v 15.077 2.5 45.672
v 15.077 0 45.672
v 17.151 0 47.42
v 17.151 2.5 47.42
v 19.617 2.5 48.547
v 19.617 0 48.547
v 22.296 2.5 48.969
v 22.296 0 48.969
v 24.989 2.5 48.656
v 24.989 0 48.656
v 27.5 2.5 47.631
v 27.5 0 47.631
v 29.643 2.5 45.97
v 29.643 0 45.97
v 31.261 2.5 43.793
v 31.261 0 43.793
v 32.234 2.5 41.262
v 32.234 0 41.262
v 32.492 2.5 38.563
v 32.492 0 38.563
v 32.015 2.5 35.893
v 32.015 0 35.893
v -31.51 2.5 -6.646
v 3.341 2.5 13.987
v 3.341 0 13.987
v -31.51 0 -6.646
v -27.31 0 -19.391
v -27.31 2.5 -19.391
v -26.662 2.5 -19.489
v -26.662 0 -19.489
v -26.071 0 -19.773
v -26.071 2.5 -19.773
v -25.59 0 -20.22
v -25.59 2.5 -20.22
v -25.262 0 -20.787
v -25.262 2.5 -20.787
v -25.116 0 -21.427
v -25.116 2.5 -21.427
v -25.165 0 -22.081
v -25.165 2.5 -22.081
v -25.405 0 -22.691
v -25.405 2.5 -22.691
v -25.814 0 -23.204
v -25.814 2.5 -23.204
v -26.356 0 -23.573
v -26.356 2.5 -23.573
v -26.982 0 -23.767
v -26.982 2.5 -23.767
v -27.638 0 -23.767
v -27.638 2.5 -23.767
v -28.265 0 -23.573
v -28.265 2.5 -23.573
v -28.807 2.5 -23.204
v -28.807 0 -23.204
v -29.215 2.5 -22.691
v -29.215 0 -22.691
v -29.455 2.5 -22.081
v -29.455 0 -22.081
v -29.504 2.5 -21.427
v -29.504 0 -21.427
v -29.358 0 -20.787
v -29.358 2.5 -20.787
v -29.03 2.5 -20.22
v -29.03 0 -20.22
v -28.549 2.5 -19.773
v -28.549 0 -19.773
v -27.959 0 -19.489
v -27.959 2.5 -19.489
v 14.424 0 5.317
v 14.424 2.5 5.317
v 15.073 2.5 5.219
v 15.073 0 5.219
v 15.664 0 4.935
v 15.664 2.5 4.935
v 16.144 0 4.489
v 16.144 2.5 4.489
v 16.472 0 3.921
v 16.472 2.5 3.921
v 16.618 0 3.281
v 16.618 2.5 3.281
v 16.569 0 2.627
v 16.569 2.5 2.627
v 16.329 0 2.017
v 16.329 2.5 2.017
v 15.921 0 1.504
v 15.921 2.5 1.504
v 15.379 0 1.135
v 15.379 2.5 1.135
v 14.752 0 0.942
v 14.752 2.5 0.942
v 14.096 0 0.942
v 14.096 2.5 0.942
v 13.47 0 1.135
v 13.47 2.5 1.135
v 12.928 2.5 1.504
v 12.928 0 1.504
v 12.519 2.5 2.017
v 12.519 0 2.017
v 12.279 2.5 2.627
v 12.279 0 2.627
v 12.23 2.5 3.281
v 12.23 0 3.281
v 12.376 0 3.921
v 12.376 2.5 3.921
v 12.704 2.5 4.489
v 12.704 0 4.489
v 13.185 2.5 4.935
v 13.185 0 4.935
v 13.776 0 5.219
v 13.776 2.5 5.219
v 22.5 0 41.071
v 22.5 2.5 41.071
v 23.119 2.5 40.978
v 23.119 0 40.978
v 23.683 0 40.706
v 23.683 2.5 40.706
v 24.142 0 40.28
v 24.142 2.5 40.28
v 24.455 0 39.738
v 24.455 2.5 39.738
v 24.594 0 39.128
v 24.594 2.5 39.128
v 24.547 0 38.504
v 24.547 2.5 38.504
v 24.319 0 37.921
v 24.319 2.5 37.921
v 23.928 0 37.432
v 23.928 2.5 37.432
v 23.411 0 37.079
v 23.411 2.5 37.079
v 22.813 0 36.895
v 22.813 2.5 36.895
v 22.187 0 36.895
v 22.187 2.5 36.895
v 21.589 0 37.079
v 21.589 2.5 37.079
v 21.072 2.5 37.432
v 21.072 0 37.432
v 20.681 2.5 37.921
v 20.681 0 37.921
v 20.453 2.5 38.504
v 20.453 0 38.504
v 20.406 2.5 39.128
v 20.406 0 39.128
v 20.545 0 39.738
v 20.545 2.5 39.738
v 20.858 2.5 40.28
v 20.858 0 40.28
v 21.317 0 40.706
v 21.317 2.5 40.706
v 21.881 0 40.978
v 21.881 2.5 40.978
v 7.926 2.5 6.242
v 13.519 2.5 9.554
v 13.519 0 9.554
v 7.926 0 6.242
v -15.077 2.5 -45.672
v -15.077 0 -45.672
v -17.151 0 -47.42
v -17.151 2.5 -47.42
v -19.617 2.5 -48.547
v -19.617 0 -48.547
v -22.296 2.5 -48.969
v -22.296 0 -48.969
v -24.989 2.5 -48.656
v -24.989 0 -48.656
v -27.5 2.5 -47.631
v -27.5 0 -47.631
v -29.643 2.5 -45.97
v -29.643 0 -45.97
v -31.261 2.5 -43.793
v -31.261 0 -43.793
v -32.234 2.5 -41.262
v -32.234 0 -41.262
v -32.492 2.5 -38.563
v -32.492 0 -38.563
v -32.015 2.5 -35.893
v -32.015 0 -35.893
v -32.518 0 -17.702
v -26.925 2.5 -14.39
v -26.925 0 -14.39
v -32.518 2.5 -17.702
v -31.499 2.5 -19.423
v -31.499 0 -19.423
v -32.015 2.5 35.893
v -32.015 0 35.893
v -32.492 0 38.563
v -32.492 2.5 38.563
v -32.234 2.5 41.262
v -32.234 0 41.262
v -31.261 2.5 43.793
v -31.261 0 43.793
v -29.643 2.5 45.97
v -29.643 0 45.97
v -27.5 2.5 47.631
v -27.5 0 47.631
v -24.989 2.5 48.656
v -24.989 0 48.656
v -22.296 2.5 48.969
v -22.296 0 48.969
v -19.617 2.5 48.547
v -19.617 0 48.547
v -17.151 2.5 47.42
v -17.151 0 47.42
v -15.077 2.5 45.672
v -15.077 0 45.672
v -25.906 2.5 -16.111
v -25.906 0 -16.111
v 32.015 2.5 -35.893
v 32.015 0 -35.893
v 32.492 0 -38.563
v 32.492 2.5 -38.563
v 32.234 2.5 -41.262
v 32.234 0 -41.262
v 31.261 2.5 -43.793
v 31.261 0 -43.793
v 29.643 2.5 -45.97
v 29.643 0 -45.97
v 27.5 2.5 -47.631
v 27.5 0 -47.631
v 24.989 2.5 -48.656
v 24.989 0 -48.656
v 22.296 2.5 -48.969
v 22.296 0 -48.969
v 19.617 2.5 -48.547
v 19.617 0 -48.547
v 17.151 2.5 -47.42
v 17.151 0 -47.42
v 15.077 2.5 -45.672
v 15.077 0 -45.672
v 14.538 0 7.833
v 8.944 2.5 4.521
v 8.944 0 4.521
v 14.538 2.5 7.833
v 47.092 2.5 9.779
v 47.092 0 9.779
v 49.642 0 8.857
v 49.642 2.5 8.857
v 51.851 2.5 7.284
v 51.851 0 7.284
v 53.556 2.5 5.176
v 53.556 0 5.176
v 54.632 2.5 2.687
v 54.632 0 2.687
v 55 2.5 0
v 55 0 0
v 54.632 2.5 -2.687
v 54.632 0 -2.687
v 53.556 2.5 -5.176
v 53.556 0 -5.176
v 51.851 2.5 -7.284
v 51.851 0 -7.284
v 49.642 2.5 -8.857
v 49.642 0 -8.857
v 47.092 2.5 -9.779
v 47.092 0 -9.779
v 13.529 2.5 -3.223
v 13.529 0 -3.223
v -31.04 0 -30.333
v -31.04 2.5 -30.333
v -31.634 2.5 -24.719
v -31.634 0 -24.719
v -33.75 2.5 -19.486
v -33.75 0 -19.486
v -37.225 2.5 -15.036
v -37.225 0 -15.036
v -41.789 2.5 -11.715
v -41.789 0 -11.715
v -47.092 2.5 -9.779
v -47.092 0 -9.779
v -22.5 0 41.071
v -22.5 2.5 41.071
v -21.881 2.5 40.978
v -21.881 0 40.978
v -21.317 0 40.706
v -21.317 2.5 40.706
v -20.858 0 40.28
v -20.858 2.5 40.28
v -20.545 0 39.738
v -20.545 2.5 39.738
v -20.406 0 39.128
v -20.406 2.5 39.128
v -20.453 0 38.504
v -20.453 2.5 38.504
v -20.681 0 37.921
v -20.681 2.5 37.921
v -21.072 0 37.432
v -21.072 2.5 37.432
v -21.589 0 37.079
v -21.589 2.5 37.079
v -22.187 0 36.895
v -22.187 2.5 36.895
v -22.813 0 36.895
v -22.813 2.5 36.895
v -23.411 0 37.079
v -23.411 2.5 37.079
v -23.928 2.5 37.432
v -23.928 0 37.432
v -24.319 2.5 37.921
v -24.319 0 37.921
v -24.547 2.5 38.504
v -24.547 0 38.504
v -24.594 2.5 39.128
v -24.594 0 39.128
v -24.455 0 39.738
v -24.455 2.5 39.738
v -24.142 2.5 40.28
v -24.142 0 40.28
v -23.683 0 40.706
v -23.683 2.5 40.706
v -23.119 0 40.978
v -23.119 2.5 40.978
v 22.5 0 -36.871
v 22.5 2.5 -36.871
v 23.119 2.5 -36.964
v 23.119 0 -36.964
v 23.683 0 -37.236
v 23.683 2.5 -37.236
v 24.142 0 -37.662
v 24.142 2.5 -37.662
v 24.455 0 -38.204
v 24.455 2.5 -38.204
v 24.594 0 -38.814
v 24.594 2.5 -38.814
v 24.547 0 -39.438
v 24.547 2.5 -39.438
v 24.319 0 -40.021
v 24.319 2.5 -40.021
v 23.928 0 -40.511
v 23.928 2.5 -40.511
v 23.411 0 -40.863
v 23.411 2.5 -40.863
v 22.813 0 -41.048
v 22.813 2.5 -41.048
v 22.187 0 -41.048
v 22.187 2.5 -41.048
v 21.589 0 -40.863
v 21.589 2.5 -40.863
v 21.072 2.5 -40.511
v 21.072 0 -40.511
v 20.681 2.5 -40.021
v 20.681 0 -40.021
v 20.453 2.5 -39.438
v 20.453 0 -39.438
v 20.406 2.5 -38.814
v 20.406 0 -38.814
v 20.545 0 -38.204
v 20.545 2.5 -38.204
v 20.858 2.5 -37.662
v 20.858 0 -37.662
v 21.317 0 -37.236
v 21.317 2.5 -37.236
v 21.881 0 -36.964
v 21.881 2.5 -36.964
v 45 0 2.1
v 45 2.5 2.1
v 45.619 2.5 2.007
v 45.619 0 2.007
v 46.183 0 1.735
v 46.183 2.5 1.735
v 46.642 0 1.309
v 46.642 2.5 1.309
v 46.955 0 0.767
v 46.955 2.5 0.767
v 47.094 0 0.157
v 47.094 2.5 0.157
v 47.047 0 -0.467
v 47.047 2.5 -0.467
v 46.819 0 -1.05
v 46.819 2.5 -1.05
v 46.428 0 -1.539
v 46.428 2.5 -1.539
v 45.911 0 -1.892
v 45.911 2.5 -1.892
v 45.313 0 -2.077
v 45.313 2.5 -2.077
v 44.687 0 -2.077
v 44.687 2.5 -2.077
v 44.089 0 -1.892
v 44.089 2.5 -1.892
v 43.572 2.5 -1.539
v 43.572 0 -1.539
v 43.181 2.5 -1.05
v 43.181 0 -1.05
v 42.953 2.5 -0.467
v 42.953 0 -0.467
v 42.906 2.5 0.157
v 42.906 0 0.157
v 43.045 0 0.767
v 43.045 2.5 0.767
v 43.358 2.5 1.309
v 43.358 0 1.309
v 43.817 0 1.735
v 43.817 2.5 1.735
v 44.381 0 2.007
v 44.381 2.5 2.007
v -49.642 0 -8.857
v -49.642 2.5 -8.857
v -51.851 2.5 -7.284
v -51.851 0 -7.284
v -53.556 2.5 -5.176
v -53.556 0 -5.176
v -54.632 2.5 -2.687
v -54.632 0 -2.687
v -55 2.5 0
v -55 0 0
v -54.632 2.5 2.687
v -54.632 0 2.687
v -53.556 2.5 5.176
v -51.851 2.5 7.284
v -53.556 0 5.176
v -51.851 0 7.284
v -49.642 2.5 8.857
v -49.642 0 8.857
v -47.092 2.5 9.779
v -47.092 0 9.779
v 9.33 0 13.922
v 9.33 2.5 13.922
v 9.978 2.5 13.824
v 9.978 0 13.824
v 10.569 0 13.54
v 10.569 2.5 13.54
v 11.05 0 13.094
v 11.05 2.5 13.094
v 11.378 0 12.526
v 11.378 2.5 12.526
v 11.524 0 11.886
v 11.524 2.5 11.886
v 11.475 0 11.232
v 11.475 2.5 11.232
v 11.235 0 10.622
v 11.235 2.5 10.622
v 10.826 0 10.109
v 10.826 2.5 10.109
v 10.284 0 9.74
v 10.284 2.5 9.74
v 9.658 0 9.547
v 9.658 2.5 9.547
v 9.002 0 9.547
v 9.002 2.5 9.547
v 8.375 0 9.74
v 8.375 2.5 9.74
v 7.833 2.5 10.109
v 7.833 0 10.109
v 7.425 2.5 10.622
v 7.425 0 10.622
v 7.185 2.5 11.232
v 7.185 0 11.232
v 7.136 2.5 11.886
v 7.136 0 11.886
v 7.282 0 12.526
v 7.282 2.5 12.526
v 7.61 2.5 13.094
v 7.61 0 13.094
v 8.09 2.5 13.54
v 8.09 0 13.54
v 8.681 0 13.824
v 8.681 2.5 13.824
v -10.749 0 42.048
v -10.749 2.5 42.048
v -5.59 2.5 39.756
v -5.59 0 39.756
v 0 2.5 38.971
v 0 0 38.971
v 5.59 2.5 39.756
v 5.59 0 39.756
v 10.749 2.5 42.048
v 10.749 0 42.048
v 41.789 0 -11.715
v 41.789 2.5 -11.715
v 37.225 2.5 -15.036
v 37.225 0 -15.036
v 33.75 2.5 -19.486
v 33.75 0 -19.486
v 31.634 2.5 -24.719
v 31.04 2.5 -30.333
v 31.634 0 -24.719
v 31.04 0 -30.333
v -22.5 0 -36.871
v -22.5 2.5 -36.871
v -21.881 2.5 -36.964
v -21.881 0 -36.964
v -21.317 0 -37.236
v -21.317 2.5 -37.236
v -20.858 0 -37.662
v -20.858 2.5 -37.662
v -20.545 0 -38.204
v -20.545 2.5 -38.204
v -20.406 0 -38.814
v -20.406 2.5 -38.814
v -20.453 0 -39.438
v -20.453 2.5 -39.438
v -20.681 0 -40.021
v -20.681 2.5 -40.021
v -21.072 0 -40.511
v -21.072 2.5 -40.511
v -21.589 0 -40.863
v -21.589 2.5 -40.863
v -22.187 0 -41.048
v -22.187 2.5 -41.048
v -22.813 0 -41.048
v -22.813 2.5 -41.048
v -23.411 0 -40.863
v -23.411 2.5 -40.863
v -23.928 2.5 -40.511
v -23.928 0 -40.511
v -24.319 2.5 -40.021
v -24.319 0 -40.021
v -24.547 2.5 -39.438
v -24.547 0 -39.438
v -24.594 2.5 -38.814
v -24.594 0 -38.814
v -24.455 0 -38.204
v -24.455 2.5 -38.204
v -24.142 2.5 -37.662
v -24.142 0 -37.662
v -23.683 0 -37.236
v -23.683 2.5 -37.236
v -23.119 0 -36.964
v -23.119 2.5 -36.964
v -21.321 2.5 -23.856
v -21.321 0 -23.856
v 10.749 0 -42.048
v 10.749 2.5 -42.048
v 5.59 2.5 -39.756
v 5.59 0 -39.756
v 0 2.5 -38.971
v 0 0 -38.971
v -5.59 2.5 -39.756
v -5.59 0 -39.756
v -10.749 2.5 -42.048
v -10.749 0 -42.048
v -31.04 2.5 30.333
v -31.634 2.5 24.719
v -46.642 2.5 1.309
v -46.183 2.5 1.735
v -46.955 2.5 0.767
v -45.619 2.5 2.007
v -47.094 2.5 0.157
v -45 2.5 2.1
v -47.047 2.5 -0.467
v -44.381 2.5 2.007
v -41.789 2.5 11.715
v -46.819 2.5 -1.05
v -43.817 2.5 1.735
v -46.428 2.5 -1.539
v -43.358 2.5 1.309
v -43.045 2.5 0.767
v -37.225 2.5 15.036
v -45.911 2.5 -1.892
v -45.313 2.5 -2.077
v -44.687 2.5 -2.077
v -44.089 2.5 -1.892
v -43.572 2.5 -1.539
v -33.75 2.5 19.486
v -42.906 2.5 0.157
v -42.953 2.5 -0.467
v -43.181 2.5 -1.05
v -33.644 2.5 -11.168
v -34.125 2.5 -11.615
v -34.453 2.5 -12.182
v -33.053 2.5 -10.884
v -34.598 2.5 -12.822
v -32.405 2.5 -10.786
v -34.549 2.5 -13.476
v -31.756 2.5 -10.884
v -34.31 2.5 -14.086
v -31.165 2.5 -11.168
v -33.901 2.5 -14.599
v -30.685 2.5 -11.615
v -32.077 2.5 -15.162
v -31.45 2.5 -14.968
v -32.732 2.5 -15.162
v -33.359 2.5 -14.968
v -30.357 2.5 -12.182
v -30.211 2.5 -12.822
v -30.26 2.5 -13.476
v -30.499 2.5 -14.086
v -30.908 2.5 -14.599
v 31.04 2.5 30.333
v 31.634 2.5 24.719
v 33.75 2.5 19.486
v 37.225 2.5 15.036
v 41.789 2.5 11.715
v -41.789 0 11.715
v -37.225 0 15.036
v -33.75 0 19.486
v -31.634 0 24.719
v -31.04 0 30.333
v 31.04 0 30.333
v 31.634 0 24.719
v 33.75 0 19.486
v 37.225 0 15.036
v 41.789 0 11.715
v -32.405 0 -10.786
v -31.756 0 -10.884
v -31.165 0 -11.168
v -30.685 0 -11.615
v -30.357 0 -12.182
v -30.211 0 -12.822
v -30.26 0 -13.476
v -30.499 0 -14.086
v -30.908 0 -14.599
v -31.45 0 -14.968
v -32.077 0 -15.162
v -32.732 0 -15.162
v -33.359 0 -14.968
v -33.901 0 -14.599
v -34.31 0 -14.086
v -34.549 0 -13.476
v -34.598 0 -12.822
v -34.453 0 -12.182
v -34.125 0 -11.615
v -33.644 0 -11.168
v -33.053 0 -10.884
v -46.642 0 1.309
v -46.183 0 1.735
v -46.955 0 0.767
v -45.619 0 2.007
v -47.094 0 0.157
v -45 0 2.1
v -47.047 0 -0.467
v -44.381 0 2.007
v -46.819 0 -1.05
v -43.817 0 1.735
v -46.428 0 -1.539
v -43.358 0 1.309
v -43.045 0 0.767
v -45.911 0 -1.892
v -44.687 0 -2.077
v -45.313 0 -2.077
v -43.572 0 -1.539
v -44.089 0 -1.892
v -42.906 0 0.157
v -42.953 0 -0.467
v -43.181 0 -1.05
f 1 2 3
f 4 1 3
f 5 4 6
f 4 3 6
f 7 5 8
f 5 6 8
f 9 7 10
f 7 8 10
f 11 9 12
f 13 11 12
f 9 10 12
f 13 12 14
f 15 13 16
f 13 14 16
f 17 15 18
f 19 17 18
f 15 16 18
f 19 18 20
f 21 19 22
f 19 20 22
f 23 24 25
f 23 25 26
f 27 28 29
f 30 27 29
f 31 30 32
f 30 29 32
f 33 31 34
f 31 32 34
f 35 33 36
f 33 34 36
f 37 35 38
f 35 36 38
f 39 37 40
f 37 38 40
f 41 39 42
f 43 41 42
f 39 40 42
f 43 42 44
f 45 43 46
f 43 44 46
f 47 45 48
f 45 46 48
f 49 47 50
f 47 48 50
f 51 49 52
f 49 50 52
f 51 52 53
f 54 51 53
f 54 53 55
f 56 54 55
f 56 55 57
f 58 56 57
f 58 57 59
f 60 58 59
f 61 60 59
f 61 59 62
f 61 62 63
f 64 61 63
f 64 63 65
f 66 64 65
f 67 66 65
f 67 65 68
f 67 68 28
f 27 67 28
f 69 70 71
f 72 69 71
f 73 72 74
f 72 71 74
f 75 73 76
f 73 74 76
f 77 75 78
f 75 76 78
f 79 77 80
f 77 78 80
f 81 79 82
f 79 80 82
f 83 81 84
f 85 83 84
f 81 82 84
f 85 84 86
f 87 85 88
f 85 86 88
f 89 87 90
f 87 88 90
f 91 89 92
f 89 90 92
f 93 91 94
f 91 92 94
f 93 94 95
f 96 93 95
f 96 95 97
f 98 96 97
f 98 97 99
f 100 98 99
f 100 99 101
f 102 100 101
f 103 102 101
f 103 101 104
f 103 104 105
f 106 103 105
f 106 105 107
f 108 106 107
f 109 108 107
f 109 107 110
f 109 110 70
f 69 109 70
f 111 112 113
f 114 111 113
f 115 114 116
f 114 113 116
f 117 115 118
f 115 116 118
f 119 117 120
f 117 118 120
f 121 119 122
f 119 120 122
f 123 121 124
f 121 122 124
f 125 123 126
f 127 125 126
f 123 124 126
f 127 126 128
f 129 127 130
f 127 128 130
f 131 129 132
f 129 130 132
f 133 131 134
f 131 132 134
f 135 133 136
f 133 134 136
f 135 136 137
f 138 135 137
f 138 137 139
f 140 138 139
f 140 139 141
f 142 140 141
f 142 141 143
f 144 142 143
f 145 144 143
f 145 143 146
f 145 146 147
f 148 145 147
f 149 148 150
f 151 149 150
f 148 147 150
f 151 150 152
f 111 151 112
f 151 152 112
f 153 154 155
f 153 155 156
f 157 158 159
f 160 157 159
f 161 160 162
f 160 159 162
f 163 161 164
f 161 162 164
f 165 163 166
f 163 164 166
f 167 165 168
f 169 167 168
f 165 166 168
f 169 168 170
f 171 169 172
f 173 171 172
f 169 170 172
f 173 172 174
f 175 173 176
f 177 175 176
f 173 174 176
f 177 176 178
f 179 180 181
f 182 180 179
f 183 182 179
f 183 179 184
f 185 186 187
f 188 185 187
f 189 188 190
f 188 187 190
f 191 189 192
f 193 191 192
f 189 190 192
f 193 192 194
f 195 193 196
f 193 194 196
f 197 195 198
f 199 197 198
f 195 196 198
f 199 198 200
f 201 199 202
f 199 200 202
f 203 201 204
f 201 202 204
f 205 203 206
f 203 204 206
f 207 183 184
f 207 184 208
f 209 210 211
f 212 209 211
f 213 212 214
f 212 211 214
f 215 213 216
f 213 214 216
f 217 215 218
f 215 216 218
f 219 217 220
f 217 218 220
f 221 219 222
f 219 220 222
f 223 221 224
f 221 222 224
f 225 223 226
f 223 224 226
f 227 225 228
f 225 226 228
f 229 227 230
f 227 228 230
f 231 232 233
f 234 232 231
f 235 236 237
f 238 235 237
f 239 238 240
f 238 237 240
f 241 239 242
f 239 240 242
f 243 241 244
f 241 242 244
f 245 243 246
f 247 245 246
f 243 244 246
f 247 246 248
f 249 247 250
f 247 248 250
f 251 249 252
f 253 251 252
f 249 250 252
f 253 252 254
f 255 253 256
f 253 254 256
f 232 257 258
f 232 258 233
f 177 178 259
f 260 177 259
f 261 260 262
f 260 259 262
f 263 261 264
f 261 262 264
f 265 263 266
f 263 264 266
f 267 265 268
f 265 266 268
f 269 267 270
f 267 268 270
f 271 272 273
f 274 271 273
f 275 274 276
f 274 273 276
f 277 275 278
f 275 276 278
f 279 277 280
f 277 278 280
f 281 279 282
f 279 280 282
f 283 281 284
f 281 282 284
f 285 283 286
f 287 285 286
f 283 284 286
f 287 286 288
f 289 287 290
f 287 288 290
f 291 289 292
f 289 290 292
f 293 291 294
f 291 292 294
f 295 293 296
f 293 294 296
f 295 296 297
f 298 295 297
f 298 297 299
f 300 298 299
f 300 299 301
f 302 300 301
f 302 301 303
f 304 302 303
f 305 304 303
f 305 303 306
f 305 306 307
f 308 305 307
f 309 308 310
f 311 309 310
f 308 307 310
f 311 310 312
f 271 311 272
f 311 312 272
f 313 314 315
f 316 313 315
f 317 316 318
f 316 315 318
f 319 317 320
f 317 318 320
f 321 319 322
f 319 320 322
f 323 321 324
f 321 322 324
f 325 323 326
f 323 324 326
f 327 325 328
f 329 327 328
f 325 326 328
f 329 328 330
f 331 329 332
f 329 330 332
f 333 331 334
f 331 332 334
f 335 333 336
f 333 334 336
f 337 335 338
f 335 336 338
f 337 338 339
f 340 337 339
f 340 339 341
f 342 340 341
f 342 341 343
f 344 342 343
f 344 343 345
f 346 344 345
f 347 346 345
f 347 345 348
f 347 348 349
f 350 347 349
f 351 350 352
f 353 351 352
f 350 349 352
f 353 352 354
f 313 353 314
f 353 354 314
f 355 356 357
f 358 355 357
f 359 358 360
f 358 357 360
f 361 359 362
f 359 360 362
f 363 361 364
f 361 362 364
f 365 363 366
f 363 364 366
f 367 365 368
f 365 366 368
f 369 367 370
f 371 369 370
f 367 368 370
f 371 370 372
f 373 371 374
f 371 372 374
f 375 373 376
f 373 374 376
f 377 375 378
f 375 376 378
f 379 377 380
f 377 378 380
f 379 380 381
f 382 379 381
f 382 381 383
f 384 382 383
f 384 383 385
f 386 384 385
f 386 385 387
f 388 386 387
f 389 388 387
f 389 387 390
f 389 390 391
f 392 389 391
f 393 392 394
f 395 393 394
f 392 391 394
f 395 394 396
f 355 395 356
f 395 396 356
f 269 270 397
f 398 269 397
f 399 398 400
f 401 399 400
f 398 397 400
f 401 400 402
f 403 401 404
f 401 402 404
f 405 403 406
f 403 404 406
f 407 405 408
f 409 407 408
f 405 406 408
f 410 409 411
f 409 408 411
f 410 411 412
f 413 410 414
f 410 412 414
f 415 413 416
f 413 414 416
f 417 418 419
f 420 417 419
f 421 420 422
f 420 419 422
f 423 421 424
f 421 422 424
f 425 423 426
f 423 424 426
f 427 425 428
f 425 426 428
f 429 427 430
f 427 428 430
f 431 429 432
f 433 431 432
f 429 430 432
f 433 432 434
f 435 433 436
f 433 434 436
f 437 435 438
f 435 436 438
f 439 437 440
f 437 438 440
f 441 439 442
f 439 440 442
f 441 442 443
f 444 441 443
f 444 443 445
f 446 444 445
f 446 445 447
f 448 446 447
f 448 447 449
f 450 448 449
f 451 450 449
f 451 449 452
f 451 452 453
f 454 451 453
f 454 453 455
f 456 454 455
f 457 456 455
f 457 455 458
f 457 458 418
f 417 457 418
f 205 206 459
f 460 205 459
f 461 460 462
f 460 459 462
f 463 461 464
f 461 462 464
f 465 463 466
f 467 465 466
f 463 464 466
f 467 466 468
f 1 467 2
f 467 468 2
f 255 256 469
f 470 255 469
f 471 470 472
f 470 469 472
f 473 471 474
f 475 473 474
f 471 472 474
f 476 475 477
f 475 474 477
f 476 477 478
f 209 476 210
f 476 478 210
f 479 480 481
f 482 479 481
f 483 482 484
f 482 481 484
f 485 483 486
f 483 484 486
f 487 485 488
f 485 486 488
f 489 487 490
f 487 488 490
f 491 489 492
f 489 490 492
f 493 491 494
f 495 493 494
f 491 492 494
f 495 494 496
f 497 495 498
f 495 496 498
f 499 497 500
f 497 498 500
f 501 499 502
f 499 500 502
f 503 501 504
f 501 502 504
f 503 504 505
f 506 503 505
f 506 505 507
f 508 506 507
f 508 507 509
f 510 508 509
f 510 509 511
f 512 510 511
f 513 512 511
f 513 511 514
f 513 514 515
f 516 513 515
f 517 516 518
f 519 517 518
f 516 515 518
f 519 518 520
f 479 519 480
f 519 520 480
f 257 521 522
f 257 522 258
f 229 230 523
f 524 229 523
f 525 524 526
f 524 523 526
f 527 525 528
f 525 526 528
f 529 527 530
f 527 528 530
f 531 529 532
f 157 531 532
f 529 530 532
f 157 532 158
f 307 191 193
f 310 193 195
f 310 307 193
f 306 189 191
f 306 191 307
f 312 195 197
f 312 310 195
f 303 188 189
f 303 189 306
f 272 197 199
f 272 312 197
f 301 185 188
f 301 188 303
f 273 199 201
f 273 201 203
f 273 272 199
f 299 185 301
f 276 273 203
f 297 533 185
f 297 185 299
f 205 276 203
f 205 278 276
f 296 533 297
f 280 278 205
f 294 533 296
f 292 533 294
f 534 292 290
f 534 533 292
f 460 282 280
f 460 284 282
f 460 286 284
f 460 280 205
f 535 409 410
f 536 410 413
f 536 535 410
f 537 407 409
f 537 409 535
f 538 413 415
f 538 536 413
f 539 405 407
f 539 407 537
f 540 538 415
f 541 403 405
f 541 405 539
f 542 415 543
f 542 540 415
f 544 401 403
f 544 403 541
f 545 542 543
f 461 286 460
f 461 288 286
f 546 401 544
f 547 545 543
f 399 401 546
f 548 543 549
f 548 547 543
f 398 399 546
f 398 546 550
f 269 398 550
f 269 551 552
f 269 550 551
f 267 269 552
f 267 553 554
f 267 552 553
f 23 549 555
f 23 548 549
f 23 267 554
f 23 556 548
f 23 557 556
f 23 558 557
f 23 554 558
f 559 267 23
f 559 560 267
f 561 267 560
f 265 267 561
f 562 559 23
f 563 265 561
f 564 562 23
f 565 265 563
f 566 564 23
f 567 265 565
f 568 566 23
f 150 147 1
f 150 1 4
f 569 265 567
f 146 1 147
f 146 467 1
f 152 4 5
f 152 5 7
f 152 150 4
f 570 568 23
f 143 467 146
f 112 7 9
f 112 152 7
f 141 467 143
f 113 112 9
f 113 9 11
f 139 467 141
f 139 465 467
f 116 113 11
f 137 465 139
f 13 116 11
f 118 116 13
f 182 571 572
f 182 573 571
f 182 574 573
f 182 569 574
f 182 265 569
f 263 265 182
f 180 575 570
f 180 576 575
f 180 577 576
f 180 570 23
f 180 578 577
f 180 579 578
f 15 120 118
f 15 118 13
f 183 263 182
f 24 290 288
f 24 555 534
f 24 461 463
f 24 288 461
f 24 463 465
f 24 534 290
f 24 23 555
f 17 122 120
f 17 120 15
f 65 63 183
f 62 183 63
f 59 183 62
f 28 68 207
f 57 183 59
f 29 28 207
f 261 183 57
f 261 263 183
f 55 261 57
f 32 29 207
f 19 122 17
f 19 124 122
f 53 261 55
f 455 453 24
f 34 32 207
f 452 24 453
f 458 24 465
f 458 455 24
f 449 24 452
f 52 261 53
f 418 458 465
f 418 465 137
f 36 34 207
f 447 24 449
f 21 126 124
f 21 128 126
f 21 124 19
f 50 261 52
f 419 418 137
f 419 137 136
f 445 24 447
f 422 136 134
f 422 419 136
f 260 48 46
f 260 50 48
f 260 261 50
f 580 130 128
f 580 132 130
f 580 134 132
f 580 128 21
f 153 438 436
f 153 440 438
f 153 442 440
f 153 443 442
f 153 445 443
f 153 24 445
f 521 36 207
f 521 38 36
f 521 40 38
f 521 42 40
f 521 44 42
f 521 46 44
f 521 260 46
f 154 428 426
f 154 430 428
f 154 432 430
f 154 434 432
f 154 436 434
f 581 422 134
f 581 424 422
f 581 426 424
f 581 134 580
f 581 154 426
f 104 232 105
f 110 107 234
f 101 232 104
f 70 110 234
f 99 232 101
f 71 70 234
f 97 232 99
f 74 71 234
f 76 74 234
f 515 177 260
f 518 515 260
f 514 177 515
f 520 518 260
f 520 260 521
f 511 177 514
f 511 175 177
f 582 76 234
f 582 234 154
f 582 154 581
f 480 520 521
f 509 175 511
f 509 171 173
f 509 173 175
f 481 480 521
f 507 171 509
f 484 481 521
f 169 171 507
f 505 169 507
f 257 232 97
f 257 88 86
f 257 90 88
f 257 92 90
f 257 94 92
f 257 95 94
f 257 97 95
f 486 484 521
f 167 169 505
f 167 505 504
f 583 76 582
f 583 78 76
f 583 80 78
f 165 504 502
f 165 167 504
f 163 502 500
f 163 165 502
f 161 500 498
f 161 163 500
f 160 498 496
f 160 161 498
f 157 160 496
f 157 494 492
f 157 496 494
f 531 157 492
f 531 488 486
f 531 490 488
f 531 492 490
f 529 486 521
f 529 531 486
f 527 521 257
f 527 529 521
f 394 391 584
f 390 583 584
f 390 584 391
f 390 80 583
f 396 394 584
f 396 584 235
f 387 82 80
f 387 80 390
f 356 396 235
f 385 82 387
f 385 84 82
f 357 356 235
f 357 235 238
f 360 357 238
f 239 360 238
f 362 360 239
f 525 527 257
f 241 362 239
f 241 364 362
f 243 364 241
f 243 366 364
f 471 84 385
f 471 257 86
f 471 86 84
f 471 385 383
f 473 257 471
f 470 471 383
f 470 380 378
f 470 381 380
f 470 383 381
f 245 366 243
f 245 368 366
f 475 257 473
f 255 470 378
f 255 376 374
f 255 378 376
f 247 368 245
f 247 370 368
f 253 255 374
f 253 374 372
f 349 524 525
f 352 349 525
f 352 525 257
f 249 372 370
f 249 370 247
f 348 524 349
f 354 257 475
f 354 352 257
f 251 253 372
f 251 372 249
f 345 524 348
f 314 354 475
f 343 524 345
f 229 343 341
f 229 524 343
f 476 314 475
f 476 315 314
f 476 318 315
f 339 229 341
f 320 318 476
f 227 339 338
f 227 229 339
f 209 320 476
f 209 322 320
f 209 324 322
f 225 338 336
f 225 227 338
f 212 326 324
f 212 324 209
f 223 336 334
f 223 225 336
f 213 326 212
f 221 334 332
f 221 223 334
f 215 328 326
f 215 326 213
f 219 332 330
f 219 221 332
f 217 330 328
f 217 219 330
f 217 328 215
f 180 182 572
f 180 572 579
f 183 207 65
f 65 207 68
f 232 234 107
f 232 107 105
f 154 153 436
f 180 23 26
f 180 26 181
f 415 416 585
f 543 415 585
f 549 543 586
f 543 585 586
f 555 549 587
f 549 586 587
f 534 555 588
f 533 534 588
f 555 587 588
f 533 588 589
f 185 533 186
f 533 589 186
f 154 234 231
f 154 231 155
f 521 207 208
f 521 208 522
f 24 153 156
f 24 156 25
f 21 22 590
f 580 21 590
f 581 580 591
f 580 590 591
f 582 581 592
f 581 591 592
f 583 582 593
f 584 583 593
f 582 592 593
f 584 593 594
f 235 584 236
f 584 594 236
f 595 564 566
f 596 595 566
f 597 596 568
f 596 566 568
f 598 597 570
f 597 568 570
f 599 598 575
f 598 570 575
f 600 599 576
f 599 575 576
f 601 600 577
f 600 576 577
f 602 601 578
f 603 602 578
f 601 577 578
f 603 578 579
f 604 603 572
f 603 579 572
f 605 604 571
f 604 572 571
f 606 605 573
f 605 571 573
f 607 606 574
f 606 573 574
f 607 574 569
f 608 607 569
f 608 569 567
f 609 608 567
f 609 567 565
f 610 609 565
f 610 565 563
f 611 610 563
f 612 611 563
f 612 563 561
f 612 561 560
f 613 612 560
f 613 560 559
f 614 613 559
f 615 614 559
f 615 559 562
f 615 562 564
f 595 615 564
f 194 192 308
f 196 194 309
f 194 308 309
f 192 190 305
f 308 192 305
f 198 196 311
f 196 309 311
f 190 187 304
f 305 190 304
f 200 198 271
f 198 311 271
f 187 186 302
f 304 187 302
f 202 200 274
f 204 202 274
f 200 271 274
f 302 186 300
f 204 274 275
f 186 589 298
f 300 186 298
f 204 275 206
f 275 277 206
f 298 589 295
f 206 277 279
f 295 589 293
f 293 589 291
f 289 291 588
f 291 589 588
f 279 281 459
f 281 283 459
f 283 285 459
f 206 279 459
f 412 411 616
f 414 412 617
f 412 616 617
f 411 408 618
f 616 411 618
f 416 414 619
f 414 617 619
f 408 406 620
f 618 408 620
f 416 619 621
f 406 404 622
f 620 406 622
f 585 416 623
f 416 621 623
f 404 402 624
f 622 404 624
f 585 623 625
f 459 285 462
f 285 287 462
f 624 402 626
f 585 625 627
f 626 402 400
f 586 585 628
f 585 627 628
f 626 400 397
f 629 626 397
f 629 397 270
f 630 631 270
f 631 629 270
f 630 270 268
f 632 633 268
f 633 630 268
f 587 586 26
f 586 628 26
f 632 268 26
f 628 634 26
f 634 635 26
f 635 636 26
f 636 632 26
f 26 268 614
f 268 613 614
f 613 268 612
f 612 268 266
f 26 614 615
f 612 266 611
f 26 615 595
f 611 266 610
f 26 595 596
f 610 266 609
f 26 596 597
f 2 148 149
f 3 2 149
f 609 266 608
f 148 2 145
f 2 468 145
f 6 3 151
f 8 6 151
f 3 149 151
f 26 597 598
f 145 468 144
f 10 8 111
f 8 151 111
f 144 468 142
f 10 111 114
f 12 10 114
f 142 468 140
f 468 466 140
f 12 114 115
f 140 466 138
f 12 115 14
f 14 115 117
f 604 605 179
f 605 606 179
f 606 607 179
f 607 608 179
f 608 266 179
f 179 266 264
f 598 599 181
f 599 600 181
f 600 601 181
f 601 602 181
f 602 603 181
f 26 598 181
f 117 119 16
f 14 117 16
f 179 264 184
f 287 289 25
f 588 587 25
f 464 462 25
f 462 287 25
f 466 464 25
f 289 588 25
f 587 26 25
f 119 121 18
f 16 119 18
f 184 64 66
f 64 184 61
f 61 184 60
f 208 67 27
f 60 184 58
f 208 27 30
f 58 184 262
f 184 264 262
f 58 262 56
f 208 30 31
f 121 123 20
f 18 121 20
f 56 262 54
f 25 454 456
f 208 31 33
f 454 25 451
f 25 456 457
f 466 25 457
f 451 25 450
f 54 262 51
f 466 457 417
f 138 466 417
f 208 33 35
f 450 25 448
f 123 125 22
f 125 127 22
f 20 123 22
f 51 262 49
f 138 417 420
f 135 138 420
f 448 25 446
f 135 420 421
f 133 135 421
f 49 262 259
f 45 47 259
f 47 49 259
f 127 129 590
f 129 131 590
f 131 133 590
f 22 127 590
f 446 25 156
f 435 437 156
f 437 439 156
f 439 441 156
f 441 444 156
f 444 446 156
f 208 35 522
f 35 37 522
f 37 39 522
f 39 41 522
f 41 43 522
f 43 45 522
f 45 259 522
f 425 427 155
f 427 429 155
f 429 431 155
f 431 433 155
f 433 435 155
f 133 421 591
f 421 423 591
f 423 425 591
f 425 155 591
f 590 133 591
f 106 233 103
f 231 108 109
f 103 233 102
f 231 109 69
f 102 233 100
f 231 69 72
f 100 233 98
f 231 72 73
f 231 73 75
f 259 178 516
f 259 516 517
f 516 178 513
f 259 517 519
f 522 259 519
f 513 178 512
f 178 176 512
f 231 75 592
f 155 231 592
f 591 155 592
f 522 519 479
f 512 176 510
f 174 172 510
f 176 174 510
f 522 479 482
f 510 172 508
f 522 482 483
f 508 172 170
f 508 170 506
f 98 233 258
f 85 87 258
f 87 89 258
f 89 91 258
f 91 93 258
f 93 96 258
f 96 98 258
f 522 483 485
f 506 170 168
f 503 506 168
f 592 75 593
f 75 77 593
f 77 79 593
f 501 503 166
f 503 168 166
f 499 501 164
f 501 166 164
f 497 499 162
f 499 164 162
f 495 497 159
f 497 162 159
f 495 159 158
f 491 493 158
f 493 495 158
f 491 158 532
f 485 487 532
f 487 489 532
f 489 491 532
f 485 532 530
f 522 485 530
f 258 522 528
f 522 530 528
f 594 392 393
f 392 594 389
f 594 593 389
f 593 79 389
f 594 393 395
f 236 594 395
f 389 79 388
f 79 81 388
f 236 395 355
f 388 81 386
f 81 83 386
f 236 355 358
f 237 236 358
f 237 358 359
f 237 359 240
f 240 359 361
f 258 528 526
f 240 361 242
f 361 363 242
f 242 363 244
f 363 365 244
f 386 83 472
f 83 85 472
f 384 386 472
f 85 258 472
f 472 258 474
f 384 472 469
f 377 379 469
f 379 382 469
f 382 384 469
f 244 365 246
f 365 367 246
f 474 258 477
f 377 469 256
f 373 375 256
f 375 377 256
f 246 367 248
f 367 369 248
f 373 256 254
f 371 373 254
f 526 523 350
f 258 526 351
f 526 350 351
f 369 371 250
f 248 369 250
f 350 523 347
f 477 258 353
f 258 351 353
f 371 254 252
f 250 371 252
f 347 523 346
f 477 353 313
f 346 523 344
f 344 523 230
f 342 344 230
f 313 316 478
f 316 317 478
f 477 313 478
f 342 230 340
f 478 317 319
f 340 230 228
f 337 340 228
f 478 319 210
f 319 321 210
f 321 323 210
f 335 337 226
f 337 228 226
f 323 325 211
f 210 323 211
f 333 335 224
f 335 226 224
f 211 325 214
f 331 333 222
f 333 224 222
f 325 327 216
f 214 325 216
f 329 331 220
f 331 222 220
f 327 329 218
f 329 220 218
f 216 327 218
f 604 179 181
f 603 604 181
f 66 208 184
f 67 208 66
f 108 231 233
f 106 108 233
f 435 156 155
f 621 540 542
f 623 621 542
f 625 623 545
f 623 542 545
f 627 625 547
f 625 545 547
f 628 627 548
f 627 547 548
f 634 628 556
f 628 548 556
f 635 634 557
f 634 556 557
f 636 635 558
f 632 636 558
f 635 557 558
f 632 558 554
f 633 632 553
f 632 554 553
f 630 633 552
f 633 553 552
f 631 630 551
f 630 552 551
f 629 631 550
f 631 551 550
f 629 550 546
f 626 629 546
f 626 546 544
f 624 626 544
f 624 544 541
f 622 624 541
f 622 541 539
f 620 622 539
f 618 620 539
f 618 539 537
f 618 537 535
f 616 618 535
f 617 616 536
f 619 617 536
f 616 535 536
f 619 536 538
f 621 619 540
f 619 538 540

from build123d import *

# Parameters (mm, degrees)
SKETCH_2_R          = 6.5
EXTRUDE_1_DEPTH     = 2.5
SKETCH_3_R          = 2.1
CUT_EXTRUDE_1_DEPTH = 2.5
CUT_EXTRUDE_2_DEPTH = 10
SKETCH_5_R          = 2.2
CUT_EXTRUDE_3_DEPTH = 10
CUT_EXTRUDE_4_DEPTH = 10


with BuildPart() as part:
    # 草图2 → 凸台-拉伸1 (new body)
    with BuildSketch(Plane(origin=(0, 0, 0), x_dir=(1, 0, 0), z_dir=(0, 1, 0))):
        with BuildLine():
            ThreePointArc((-47.091925455, 9.778744699), (-55, -1.253e-06), (-47.091923006, -9.778745223))
            ThreePointArc((-47.091923006, -9.778745223), (-33.750000065, -19.485571473), (-32.014603203, -35.893428778))
            ThreePointArc((-32.014603203, -35.893428778), (-27.500000081, -47.631397162), (-15.077319674, -45.672174193))
            ThreePointArc((-15.077319674, -45.672174193), (-9.8e-08, -38.97114317), (15.077319542, -45.672174048))
            ThreePointArc((15.077319542, -45.672174048), (27.500000118, -47.63139714), (32.014603117, -35.893428511))
            ThreePointArc((32.014603117, -35.893428511), (33.750000078, -19.485571451), (47.091922781, -9.778745271))
            ThreePointArc((47.091922781, -9.778745271), (55, -2.05e-07), (47.091923183, 9.778745185))
            ThreePointArc((47.091923183, 9.778745185), (33.750000105, 19.485571404), (32.01460321, 35.893428798))
            ThreePointArc((32.01460321, 35.893428798), (27.499999984, 47.631397217), (15.077319539, 45.672174044))
            ThreePointArc((15.077319539, 45.672174044), (1.8e-08, 38.97114317), (-15.077319515, 45.672174018))
            ThreePointArc((-15.077319515, 45.672174018), (-27.5000001, 47.63139715), (-32.014603117, 35.893428511))
            ThreePointArc((-32.014603117, 35.893428511), (-33.750000761, 19.485570266), (-47.091925455, 9.778744699))
        make_face()
        with Locations(Location((0, 0, 0), (0, 0, 270))):
            Circle(SKETCH_2_R, mode=Mode.SUBTRACT)
    extrude(amount=EXTRUDE_1_DEPTH)

    # 草图3 → 切除-拉伸1 (cut)
    with BuildSketch(Plane(origin=(0, 2.5, 0), x_dir=(1, 0, 0), z_dir=(0, 1, 0))):
        with Locations(Location((-22.5, 38.97114317, 0), (0, 0, 270))):
            Circle(SKETCH_3_R)
        with Locations(Location((22.5, 38.97114317, 0), (0, 0, 270))):
            Circle(SKETCH_3_R)
        with Locations(Location((45, 0, 0), (0, 0, 270))):
            Circle(SKETCH_3_R)
        with Locations(Location((22.5, -38.97114317, 0), (0, 0, 270))):
            Circle(SKETCH_3_R)
        with Locations(Location((-22.5, -38.97114317, 0), (0, 0, 270))):
            Circle(SKETCH_3_R)
        with Locations(Location((-45, 0, 0), (0, 0, 270))):
            Circle(SKETCH_3_R)
    extrude(amount=-CUT_EXTRUDE_1_DEPTH, mode=Mode.SUBTRACT)

    # 草图4 → 切除-拉伸2 (cut)
    with BuildSketch(Plane(origin=(0, 2.5, 0), x_dir=(1, 0, 0), z_dir=(0, 1, 0))):
        Polygon((-21.320889551, 23.855935356), (13.529450533, 3.223344728), (3.340516889, -13.986699758), (-31.509823195, 6.64589087), align=None)
    extrude(amount=-CUT_EXTRUDE_2_DEPTH, mode=Mode.SUBTRACT)

    # 草图5 → 切除-拉伸3 (cut)
    with BuildSketch(Plane(origin=(0, 2.5, 0), x_dir=(1, 0, 0), z_dir=(0, 1, 0))):
        with Locations(Location((14.424226019, -3.116953122, 0), (0, 0, 270))):
            Circle(SKETCH_5_R)
        with Locations(Location((9.329759197, -11.721975365, 0), (0, 0, 270))):
            Circle(SKETCH_5_R)
        with Locations(Location((-27.310131859, 21.591210963, 0), (0, 0, 270))):
            Circle(SKETCH_5_R)
        with Locations(Location((-32.404598681, 12.98618872, 0), (0, 0, 270))):
            Circle(SKETCH_5_R)
    extrude(amount=-CUT_EXTRUDE_3_DEPTH, mode=Mode.SUBTRACT)

    # 草图6 → 切除-拉伸4 (cut)
    with BuildSketch(Plane(origin=(0, 2.5, 0), x_dir=(1, 0, 0), z_dir=(0, 1, 0))):
        Polygon((-32.518067513, 17.701814323), (-31.499174149, 19.422818771), (14.537694851, -7.832578725), (13.518801487, -9.553583174), align=None)
    extrude(amount=-CUT_EXTRUDE_4_DEPTH, mode=Mode.SUBTRACT)


solid = part.part
